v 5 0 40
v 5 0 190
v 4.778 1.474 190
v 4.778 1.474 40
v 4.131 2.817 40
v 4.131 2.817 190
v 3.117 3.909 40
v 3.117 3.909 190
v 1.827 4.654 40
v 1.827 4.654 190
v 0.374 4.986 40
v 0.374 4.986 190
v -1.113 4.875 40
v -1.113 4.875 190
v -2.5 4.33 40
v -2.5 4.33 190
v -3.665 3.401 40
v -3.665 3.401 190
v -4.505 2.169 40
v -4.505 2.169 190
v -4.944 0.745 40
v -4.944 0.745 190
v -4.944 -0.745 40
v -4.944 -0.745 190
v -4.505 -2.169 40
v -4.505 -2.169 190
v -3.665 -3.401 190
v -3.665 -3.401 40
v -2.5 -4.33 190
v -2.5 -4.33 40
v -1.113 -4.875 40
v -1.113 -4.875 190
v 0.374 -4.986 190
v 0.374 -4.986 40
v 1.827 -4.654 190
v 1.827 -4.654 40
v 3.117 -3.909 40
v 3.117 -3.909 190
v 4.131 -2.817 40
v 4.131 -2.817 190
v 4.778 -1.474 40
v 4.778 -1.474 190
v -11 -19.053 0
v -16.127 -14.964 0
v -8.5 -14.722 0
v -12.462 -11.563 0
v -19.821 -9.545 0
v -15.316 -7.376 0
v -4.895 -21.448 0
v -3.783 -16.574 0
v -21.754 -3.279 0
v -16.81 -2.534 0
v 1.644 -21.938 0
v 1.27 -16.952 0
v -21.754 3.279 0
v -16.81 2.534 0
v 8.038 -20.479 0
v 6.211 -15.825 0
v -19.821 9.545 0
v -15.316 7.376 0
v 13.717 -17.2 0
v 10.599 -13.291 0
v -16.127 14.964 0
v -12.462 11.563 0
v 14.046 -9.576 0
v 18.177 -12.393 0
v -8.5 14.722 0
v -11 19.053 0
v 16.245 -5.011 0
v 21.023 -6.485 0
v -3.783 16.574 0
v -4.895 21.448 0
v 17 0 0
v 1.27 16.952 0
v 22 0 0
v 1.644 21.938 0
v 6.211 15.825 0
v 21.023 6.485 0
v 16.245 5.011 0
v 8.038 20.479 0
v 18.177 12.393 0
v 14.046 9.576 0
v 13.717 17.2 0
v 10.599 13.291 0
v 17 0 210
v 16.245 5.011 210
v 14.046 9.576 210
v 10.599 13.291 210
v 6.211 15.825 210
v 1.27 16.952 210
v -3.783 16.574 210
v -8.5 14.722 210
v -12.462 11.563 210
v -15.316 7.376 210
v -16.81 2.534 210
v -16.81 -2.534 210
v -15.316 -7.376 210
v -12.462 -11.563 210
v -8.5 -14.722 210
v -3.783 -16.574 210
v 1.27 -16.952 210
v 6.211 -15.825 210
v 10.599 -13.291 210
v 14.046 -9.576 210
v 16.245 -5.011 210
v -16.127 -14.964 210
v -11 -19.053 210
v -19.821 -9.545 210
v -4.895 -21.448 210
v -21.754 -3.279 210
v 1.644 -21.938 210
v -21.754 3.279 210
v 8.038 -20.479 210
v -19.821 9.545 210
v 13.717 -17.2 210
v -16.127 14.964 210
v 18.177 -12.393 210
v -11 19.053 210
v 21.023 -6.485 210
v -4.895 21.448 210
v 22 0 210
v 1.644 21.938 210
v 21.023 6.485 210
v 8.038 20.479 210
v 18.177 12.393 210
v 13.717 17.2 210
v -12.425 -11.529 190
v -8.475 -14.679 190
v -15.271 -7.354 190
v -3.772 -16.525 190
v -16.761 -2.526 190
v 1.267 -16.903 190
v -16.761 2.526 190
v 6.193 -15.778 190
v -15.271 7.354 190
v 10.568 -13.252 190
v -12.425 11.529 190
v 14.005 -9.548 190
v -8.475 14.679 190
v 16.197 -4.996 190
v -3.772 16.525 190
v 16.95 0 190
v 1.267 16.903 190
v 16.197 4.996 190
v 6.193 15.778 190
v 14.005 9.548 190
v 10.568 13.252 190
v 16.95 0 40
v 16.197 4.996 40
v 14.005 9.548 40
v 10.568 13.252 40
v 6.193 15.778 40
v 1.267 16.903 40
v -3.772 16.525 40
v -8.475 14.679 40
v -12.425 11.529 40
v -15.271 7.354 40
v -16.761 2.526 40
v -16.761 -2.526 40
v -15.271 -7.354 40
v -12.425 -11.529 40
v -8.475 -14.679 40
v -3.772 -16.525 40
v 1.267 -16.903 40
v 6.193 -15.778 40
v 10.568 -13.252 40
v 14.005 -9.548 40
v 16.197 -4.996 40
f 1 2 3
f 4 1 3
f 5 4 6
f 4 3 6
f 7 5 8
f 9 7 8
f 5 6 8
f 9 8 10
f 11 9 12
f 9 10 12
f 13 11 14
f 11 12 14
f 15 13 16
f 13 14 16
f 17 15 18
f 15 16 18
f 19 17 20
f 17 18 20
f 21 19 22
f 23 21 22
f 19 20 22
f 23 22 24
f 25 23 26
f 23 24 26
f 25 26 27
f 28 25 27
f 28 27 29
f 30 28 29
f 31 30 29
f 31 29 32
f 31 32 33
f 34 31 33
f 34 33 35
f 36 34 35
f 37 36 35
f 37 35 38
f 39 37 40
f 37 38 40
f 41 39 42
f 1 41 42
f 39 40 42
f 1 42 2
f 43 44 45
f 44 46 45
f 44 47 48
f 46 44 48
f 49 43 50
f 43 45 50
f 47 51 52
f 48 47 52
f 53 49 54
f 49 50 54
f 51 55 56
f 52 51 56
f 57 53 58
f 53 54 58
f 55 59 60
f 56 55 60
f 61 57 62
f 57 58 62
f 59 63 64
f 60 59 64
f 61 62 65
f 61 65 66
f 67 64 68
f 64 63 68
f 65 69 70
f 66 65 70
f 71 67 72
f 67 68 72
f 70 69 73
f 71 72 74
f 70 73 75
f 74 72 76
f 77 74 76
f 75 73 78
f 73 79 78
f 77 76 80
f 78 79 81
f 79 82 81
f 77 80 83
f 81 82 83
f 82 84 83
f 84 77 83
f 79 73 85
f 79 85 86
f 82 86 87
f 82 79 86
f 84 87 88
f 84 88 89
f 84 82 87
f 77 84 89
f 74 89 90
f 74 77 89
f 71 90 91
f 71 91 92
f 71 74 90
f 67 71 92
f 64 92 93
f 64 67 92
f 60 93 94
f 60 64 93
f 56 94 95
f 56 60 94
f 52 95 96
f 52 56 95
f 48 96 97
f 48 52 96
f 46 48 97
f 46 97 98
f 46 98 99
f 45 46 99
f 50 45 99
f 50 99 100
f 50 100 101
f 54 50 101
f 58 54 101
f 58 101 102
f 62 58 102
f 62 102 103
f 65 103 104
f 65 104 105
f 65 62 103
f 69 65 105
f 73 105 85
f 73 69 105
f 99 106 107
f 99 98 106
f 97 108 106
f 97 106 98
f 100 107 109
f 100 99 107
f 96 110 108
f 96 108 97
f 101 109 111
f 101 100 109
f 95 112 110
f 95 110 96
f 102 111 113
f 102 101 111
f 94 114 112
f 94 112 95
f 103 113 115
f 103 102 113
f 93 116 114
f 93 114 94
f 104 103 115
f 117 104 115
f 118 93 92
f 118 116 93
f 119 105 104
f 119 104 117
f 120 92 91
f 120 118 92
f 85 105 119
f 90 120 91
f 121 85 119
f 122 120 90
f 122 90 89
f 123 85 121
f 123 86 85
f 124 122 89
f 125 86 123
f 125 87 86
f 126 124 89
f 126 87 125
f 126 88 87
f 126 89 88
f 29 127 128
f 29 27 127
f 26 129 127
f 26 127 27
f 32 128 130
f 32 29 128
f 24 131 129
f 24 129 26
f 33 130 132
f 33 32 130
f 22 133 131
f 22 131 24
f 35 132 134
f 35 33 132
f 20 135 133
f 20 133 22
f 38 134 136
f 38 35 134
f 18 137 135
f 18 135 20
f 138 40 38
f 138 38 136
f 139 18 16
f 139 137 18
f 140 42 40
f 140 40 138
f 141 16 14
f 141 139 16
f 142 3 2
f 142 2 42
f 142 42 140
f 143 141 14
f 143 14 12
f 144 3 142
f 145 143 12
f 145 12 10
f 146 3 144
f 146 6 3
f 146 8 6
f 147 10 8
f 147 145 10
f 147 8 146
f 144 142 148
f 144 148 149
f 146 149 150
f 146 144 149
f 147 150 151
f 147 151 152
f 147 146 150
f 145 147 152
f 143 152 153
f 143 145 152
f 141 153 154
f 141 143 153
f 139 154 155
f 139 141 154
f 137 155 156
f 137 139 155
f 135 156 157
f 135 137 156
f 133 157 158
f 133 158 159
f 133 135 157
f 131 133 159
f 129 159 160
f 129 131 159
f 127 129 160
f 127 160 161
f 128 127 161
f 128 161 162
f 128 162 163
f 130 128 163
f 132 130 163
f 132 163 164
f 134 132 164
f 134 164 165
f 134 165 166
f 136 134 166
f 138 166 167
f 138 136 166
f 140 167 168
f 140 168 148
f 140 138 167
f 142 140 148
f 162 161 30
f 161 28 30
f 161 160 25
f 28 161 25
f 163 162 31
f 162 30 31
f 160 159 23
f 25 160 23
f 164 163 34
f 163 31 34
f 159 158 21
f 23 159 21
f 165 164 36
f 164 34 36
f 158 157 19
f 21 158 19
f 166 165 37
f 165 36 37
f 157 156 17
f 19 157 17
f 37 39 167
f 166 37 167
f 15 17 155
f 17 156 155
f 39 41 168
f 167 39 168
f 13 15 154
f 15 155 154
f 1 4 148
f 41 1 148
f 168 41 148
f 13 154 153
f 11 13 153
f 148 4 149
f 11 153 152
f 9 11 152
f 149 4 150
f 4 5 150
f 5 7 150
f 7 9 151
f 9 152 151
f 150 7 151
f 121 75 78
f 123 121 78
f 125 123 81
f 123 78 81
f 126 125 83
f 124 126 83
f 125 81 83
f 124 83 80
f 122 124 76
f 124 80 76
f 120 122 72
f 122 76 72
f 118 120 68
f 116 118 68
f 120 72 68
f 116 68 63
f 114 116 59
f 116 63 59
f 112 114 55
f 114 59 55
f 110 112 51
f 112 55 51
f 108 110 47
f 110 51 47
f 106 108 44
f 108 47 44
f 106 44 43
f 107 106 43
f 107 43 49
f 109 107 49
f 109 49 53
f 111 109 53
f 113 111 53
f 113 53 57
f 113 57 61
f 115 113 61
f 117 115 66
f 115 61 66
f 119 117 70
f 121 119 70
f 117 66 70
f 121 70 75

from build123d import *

# Parameters (mm, degrees)
SKETCH2_R           = 22
SKETCH2_R_2         = 17
BOSS_EXTRUDE1_DEPTH = 210
BOSS_EXTRUDE2_START = -20
SKETCH3_R           = 16.95
SKETCH3_R_2         = 5
BOSS_EXTRUDE2_DEPTH = 150


with BuildPart() as part:
    # Sketch2 → Boss-Extrude1 (new body)
    with BuildSketch(Plane.XY):
        Circle(SKETCH2_R)
        Circle(SKETCH2_R_2, mode=Mode.SUBTRACT)
    extrude(amount=BOSS_EXTRUDE1_DEPTH)


with BuildPart() as body_2:
    # Sketch3 → Boss-Extrude2 (new body)
    with BuildSketch(Plane.XY.offset(210).offset(BOSS_EXTRUDE2_START)):
        Circle(SKETCH3_R)
        Circle(SKETCH3_R_2, mode=Mode.SUBTRACT)
    extrude(amount=-BOSS_EXTRUDE2_DEPTH)


solid = Compound([part.part, body_2.part])
